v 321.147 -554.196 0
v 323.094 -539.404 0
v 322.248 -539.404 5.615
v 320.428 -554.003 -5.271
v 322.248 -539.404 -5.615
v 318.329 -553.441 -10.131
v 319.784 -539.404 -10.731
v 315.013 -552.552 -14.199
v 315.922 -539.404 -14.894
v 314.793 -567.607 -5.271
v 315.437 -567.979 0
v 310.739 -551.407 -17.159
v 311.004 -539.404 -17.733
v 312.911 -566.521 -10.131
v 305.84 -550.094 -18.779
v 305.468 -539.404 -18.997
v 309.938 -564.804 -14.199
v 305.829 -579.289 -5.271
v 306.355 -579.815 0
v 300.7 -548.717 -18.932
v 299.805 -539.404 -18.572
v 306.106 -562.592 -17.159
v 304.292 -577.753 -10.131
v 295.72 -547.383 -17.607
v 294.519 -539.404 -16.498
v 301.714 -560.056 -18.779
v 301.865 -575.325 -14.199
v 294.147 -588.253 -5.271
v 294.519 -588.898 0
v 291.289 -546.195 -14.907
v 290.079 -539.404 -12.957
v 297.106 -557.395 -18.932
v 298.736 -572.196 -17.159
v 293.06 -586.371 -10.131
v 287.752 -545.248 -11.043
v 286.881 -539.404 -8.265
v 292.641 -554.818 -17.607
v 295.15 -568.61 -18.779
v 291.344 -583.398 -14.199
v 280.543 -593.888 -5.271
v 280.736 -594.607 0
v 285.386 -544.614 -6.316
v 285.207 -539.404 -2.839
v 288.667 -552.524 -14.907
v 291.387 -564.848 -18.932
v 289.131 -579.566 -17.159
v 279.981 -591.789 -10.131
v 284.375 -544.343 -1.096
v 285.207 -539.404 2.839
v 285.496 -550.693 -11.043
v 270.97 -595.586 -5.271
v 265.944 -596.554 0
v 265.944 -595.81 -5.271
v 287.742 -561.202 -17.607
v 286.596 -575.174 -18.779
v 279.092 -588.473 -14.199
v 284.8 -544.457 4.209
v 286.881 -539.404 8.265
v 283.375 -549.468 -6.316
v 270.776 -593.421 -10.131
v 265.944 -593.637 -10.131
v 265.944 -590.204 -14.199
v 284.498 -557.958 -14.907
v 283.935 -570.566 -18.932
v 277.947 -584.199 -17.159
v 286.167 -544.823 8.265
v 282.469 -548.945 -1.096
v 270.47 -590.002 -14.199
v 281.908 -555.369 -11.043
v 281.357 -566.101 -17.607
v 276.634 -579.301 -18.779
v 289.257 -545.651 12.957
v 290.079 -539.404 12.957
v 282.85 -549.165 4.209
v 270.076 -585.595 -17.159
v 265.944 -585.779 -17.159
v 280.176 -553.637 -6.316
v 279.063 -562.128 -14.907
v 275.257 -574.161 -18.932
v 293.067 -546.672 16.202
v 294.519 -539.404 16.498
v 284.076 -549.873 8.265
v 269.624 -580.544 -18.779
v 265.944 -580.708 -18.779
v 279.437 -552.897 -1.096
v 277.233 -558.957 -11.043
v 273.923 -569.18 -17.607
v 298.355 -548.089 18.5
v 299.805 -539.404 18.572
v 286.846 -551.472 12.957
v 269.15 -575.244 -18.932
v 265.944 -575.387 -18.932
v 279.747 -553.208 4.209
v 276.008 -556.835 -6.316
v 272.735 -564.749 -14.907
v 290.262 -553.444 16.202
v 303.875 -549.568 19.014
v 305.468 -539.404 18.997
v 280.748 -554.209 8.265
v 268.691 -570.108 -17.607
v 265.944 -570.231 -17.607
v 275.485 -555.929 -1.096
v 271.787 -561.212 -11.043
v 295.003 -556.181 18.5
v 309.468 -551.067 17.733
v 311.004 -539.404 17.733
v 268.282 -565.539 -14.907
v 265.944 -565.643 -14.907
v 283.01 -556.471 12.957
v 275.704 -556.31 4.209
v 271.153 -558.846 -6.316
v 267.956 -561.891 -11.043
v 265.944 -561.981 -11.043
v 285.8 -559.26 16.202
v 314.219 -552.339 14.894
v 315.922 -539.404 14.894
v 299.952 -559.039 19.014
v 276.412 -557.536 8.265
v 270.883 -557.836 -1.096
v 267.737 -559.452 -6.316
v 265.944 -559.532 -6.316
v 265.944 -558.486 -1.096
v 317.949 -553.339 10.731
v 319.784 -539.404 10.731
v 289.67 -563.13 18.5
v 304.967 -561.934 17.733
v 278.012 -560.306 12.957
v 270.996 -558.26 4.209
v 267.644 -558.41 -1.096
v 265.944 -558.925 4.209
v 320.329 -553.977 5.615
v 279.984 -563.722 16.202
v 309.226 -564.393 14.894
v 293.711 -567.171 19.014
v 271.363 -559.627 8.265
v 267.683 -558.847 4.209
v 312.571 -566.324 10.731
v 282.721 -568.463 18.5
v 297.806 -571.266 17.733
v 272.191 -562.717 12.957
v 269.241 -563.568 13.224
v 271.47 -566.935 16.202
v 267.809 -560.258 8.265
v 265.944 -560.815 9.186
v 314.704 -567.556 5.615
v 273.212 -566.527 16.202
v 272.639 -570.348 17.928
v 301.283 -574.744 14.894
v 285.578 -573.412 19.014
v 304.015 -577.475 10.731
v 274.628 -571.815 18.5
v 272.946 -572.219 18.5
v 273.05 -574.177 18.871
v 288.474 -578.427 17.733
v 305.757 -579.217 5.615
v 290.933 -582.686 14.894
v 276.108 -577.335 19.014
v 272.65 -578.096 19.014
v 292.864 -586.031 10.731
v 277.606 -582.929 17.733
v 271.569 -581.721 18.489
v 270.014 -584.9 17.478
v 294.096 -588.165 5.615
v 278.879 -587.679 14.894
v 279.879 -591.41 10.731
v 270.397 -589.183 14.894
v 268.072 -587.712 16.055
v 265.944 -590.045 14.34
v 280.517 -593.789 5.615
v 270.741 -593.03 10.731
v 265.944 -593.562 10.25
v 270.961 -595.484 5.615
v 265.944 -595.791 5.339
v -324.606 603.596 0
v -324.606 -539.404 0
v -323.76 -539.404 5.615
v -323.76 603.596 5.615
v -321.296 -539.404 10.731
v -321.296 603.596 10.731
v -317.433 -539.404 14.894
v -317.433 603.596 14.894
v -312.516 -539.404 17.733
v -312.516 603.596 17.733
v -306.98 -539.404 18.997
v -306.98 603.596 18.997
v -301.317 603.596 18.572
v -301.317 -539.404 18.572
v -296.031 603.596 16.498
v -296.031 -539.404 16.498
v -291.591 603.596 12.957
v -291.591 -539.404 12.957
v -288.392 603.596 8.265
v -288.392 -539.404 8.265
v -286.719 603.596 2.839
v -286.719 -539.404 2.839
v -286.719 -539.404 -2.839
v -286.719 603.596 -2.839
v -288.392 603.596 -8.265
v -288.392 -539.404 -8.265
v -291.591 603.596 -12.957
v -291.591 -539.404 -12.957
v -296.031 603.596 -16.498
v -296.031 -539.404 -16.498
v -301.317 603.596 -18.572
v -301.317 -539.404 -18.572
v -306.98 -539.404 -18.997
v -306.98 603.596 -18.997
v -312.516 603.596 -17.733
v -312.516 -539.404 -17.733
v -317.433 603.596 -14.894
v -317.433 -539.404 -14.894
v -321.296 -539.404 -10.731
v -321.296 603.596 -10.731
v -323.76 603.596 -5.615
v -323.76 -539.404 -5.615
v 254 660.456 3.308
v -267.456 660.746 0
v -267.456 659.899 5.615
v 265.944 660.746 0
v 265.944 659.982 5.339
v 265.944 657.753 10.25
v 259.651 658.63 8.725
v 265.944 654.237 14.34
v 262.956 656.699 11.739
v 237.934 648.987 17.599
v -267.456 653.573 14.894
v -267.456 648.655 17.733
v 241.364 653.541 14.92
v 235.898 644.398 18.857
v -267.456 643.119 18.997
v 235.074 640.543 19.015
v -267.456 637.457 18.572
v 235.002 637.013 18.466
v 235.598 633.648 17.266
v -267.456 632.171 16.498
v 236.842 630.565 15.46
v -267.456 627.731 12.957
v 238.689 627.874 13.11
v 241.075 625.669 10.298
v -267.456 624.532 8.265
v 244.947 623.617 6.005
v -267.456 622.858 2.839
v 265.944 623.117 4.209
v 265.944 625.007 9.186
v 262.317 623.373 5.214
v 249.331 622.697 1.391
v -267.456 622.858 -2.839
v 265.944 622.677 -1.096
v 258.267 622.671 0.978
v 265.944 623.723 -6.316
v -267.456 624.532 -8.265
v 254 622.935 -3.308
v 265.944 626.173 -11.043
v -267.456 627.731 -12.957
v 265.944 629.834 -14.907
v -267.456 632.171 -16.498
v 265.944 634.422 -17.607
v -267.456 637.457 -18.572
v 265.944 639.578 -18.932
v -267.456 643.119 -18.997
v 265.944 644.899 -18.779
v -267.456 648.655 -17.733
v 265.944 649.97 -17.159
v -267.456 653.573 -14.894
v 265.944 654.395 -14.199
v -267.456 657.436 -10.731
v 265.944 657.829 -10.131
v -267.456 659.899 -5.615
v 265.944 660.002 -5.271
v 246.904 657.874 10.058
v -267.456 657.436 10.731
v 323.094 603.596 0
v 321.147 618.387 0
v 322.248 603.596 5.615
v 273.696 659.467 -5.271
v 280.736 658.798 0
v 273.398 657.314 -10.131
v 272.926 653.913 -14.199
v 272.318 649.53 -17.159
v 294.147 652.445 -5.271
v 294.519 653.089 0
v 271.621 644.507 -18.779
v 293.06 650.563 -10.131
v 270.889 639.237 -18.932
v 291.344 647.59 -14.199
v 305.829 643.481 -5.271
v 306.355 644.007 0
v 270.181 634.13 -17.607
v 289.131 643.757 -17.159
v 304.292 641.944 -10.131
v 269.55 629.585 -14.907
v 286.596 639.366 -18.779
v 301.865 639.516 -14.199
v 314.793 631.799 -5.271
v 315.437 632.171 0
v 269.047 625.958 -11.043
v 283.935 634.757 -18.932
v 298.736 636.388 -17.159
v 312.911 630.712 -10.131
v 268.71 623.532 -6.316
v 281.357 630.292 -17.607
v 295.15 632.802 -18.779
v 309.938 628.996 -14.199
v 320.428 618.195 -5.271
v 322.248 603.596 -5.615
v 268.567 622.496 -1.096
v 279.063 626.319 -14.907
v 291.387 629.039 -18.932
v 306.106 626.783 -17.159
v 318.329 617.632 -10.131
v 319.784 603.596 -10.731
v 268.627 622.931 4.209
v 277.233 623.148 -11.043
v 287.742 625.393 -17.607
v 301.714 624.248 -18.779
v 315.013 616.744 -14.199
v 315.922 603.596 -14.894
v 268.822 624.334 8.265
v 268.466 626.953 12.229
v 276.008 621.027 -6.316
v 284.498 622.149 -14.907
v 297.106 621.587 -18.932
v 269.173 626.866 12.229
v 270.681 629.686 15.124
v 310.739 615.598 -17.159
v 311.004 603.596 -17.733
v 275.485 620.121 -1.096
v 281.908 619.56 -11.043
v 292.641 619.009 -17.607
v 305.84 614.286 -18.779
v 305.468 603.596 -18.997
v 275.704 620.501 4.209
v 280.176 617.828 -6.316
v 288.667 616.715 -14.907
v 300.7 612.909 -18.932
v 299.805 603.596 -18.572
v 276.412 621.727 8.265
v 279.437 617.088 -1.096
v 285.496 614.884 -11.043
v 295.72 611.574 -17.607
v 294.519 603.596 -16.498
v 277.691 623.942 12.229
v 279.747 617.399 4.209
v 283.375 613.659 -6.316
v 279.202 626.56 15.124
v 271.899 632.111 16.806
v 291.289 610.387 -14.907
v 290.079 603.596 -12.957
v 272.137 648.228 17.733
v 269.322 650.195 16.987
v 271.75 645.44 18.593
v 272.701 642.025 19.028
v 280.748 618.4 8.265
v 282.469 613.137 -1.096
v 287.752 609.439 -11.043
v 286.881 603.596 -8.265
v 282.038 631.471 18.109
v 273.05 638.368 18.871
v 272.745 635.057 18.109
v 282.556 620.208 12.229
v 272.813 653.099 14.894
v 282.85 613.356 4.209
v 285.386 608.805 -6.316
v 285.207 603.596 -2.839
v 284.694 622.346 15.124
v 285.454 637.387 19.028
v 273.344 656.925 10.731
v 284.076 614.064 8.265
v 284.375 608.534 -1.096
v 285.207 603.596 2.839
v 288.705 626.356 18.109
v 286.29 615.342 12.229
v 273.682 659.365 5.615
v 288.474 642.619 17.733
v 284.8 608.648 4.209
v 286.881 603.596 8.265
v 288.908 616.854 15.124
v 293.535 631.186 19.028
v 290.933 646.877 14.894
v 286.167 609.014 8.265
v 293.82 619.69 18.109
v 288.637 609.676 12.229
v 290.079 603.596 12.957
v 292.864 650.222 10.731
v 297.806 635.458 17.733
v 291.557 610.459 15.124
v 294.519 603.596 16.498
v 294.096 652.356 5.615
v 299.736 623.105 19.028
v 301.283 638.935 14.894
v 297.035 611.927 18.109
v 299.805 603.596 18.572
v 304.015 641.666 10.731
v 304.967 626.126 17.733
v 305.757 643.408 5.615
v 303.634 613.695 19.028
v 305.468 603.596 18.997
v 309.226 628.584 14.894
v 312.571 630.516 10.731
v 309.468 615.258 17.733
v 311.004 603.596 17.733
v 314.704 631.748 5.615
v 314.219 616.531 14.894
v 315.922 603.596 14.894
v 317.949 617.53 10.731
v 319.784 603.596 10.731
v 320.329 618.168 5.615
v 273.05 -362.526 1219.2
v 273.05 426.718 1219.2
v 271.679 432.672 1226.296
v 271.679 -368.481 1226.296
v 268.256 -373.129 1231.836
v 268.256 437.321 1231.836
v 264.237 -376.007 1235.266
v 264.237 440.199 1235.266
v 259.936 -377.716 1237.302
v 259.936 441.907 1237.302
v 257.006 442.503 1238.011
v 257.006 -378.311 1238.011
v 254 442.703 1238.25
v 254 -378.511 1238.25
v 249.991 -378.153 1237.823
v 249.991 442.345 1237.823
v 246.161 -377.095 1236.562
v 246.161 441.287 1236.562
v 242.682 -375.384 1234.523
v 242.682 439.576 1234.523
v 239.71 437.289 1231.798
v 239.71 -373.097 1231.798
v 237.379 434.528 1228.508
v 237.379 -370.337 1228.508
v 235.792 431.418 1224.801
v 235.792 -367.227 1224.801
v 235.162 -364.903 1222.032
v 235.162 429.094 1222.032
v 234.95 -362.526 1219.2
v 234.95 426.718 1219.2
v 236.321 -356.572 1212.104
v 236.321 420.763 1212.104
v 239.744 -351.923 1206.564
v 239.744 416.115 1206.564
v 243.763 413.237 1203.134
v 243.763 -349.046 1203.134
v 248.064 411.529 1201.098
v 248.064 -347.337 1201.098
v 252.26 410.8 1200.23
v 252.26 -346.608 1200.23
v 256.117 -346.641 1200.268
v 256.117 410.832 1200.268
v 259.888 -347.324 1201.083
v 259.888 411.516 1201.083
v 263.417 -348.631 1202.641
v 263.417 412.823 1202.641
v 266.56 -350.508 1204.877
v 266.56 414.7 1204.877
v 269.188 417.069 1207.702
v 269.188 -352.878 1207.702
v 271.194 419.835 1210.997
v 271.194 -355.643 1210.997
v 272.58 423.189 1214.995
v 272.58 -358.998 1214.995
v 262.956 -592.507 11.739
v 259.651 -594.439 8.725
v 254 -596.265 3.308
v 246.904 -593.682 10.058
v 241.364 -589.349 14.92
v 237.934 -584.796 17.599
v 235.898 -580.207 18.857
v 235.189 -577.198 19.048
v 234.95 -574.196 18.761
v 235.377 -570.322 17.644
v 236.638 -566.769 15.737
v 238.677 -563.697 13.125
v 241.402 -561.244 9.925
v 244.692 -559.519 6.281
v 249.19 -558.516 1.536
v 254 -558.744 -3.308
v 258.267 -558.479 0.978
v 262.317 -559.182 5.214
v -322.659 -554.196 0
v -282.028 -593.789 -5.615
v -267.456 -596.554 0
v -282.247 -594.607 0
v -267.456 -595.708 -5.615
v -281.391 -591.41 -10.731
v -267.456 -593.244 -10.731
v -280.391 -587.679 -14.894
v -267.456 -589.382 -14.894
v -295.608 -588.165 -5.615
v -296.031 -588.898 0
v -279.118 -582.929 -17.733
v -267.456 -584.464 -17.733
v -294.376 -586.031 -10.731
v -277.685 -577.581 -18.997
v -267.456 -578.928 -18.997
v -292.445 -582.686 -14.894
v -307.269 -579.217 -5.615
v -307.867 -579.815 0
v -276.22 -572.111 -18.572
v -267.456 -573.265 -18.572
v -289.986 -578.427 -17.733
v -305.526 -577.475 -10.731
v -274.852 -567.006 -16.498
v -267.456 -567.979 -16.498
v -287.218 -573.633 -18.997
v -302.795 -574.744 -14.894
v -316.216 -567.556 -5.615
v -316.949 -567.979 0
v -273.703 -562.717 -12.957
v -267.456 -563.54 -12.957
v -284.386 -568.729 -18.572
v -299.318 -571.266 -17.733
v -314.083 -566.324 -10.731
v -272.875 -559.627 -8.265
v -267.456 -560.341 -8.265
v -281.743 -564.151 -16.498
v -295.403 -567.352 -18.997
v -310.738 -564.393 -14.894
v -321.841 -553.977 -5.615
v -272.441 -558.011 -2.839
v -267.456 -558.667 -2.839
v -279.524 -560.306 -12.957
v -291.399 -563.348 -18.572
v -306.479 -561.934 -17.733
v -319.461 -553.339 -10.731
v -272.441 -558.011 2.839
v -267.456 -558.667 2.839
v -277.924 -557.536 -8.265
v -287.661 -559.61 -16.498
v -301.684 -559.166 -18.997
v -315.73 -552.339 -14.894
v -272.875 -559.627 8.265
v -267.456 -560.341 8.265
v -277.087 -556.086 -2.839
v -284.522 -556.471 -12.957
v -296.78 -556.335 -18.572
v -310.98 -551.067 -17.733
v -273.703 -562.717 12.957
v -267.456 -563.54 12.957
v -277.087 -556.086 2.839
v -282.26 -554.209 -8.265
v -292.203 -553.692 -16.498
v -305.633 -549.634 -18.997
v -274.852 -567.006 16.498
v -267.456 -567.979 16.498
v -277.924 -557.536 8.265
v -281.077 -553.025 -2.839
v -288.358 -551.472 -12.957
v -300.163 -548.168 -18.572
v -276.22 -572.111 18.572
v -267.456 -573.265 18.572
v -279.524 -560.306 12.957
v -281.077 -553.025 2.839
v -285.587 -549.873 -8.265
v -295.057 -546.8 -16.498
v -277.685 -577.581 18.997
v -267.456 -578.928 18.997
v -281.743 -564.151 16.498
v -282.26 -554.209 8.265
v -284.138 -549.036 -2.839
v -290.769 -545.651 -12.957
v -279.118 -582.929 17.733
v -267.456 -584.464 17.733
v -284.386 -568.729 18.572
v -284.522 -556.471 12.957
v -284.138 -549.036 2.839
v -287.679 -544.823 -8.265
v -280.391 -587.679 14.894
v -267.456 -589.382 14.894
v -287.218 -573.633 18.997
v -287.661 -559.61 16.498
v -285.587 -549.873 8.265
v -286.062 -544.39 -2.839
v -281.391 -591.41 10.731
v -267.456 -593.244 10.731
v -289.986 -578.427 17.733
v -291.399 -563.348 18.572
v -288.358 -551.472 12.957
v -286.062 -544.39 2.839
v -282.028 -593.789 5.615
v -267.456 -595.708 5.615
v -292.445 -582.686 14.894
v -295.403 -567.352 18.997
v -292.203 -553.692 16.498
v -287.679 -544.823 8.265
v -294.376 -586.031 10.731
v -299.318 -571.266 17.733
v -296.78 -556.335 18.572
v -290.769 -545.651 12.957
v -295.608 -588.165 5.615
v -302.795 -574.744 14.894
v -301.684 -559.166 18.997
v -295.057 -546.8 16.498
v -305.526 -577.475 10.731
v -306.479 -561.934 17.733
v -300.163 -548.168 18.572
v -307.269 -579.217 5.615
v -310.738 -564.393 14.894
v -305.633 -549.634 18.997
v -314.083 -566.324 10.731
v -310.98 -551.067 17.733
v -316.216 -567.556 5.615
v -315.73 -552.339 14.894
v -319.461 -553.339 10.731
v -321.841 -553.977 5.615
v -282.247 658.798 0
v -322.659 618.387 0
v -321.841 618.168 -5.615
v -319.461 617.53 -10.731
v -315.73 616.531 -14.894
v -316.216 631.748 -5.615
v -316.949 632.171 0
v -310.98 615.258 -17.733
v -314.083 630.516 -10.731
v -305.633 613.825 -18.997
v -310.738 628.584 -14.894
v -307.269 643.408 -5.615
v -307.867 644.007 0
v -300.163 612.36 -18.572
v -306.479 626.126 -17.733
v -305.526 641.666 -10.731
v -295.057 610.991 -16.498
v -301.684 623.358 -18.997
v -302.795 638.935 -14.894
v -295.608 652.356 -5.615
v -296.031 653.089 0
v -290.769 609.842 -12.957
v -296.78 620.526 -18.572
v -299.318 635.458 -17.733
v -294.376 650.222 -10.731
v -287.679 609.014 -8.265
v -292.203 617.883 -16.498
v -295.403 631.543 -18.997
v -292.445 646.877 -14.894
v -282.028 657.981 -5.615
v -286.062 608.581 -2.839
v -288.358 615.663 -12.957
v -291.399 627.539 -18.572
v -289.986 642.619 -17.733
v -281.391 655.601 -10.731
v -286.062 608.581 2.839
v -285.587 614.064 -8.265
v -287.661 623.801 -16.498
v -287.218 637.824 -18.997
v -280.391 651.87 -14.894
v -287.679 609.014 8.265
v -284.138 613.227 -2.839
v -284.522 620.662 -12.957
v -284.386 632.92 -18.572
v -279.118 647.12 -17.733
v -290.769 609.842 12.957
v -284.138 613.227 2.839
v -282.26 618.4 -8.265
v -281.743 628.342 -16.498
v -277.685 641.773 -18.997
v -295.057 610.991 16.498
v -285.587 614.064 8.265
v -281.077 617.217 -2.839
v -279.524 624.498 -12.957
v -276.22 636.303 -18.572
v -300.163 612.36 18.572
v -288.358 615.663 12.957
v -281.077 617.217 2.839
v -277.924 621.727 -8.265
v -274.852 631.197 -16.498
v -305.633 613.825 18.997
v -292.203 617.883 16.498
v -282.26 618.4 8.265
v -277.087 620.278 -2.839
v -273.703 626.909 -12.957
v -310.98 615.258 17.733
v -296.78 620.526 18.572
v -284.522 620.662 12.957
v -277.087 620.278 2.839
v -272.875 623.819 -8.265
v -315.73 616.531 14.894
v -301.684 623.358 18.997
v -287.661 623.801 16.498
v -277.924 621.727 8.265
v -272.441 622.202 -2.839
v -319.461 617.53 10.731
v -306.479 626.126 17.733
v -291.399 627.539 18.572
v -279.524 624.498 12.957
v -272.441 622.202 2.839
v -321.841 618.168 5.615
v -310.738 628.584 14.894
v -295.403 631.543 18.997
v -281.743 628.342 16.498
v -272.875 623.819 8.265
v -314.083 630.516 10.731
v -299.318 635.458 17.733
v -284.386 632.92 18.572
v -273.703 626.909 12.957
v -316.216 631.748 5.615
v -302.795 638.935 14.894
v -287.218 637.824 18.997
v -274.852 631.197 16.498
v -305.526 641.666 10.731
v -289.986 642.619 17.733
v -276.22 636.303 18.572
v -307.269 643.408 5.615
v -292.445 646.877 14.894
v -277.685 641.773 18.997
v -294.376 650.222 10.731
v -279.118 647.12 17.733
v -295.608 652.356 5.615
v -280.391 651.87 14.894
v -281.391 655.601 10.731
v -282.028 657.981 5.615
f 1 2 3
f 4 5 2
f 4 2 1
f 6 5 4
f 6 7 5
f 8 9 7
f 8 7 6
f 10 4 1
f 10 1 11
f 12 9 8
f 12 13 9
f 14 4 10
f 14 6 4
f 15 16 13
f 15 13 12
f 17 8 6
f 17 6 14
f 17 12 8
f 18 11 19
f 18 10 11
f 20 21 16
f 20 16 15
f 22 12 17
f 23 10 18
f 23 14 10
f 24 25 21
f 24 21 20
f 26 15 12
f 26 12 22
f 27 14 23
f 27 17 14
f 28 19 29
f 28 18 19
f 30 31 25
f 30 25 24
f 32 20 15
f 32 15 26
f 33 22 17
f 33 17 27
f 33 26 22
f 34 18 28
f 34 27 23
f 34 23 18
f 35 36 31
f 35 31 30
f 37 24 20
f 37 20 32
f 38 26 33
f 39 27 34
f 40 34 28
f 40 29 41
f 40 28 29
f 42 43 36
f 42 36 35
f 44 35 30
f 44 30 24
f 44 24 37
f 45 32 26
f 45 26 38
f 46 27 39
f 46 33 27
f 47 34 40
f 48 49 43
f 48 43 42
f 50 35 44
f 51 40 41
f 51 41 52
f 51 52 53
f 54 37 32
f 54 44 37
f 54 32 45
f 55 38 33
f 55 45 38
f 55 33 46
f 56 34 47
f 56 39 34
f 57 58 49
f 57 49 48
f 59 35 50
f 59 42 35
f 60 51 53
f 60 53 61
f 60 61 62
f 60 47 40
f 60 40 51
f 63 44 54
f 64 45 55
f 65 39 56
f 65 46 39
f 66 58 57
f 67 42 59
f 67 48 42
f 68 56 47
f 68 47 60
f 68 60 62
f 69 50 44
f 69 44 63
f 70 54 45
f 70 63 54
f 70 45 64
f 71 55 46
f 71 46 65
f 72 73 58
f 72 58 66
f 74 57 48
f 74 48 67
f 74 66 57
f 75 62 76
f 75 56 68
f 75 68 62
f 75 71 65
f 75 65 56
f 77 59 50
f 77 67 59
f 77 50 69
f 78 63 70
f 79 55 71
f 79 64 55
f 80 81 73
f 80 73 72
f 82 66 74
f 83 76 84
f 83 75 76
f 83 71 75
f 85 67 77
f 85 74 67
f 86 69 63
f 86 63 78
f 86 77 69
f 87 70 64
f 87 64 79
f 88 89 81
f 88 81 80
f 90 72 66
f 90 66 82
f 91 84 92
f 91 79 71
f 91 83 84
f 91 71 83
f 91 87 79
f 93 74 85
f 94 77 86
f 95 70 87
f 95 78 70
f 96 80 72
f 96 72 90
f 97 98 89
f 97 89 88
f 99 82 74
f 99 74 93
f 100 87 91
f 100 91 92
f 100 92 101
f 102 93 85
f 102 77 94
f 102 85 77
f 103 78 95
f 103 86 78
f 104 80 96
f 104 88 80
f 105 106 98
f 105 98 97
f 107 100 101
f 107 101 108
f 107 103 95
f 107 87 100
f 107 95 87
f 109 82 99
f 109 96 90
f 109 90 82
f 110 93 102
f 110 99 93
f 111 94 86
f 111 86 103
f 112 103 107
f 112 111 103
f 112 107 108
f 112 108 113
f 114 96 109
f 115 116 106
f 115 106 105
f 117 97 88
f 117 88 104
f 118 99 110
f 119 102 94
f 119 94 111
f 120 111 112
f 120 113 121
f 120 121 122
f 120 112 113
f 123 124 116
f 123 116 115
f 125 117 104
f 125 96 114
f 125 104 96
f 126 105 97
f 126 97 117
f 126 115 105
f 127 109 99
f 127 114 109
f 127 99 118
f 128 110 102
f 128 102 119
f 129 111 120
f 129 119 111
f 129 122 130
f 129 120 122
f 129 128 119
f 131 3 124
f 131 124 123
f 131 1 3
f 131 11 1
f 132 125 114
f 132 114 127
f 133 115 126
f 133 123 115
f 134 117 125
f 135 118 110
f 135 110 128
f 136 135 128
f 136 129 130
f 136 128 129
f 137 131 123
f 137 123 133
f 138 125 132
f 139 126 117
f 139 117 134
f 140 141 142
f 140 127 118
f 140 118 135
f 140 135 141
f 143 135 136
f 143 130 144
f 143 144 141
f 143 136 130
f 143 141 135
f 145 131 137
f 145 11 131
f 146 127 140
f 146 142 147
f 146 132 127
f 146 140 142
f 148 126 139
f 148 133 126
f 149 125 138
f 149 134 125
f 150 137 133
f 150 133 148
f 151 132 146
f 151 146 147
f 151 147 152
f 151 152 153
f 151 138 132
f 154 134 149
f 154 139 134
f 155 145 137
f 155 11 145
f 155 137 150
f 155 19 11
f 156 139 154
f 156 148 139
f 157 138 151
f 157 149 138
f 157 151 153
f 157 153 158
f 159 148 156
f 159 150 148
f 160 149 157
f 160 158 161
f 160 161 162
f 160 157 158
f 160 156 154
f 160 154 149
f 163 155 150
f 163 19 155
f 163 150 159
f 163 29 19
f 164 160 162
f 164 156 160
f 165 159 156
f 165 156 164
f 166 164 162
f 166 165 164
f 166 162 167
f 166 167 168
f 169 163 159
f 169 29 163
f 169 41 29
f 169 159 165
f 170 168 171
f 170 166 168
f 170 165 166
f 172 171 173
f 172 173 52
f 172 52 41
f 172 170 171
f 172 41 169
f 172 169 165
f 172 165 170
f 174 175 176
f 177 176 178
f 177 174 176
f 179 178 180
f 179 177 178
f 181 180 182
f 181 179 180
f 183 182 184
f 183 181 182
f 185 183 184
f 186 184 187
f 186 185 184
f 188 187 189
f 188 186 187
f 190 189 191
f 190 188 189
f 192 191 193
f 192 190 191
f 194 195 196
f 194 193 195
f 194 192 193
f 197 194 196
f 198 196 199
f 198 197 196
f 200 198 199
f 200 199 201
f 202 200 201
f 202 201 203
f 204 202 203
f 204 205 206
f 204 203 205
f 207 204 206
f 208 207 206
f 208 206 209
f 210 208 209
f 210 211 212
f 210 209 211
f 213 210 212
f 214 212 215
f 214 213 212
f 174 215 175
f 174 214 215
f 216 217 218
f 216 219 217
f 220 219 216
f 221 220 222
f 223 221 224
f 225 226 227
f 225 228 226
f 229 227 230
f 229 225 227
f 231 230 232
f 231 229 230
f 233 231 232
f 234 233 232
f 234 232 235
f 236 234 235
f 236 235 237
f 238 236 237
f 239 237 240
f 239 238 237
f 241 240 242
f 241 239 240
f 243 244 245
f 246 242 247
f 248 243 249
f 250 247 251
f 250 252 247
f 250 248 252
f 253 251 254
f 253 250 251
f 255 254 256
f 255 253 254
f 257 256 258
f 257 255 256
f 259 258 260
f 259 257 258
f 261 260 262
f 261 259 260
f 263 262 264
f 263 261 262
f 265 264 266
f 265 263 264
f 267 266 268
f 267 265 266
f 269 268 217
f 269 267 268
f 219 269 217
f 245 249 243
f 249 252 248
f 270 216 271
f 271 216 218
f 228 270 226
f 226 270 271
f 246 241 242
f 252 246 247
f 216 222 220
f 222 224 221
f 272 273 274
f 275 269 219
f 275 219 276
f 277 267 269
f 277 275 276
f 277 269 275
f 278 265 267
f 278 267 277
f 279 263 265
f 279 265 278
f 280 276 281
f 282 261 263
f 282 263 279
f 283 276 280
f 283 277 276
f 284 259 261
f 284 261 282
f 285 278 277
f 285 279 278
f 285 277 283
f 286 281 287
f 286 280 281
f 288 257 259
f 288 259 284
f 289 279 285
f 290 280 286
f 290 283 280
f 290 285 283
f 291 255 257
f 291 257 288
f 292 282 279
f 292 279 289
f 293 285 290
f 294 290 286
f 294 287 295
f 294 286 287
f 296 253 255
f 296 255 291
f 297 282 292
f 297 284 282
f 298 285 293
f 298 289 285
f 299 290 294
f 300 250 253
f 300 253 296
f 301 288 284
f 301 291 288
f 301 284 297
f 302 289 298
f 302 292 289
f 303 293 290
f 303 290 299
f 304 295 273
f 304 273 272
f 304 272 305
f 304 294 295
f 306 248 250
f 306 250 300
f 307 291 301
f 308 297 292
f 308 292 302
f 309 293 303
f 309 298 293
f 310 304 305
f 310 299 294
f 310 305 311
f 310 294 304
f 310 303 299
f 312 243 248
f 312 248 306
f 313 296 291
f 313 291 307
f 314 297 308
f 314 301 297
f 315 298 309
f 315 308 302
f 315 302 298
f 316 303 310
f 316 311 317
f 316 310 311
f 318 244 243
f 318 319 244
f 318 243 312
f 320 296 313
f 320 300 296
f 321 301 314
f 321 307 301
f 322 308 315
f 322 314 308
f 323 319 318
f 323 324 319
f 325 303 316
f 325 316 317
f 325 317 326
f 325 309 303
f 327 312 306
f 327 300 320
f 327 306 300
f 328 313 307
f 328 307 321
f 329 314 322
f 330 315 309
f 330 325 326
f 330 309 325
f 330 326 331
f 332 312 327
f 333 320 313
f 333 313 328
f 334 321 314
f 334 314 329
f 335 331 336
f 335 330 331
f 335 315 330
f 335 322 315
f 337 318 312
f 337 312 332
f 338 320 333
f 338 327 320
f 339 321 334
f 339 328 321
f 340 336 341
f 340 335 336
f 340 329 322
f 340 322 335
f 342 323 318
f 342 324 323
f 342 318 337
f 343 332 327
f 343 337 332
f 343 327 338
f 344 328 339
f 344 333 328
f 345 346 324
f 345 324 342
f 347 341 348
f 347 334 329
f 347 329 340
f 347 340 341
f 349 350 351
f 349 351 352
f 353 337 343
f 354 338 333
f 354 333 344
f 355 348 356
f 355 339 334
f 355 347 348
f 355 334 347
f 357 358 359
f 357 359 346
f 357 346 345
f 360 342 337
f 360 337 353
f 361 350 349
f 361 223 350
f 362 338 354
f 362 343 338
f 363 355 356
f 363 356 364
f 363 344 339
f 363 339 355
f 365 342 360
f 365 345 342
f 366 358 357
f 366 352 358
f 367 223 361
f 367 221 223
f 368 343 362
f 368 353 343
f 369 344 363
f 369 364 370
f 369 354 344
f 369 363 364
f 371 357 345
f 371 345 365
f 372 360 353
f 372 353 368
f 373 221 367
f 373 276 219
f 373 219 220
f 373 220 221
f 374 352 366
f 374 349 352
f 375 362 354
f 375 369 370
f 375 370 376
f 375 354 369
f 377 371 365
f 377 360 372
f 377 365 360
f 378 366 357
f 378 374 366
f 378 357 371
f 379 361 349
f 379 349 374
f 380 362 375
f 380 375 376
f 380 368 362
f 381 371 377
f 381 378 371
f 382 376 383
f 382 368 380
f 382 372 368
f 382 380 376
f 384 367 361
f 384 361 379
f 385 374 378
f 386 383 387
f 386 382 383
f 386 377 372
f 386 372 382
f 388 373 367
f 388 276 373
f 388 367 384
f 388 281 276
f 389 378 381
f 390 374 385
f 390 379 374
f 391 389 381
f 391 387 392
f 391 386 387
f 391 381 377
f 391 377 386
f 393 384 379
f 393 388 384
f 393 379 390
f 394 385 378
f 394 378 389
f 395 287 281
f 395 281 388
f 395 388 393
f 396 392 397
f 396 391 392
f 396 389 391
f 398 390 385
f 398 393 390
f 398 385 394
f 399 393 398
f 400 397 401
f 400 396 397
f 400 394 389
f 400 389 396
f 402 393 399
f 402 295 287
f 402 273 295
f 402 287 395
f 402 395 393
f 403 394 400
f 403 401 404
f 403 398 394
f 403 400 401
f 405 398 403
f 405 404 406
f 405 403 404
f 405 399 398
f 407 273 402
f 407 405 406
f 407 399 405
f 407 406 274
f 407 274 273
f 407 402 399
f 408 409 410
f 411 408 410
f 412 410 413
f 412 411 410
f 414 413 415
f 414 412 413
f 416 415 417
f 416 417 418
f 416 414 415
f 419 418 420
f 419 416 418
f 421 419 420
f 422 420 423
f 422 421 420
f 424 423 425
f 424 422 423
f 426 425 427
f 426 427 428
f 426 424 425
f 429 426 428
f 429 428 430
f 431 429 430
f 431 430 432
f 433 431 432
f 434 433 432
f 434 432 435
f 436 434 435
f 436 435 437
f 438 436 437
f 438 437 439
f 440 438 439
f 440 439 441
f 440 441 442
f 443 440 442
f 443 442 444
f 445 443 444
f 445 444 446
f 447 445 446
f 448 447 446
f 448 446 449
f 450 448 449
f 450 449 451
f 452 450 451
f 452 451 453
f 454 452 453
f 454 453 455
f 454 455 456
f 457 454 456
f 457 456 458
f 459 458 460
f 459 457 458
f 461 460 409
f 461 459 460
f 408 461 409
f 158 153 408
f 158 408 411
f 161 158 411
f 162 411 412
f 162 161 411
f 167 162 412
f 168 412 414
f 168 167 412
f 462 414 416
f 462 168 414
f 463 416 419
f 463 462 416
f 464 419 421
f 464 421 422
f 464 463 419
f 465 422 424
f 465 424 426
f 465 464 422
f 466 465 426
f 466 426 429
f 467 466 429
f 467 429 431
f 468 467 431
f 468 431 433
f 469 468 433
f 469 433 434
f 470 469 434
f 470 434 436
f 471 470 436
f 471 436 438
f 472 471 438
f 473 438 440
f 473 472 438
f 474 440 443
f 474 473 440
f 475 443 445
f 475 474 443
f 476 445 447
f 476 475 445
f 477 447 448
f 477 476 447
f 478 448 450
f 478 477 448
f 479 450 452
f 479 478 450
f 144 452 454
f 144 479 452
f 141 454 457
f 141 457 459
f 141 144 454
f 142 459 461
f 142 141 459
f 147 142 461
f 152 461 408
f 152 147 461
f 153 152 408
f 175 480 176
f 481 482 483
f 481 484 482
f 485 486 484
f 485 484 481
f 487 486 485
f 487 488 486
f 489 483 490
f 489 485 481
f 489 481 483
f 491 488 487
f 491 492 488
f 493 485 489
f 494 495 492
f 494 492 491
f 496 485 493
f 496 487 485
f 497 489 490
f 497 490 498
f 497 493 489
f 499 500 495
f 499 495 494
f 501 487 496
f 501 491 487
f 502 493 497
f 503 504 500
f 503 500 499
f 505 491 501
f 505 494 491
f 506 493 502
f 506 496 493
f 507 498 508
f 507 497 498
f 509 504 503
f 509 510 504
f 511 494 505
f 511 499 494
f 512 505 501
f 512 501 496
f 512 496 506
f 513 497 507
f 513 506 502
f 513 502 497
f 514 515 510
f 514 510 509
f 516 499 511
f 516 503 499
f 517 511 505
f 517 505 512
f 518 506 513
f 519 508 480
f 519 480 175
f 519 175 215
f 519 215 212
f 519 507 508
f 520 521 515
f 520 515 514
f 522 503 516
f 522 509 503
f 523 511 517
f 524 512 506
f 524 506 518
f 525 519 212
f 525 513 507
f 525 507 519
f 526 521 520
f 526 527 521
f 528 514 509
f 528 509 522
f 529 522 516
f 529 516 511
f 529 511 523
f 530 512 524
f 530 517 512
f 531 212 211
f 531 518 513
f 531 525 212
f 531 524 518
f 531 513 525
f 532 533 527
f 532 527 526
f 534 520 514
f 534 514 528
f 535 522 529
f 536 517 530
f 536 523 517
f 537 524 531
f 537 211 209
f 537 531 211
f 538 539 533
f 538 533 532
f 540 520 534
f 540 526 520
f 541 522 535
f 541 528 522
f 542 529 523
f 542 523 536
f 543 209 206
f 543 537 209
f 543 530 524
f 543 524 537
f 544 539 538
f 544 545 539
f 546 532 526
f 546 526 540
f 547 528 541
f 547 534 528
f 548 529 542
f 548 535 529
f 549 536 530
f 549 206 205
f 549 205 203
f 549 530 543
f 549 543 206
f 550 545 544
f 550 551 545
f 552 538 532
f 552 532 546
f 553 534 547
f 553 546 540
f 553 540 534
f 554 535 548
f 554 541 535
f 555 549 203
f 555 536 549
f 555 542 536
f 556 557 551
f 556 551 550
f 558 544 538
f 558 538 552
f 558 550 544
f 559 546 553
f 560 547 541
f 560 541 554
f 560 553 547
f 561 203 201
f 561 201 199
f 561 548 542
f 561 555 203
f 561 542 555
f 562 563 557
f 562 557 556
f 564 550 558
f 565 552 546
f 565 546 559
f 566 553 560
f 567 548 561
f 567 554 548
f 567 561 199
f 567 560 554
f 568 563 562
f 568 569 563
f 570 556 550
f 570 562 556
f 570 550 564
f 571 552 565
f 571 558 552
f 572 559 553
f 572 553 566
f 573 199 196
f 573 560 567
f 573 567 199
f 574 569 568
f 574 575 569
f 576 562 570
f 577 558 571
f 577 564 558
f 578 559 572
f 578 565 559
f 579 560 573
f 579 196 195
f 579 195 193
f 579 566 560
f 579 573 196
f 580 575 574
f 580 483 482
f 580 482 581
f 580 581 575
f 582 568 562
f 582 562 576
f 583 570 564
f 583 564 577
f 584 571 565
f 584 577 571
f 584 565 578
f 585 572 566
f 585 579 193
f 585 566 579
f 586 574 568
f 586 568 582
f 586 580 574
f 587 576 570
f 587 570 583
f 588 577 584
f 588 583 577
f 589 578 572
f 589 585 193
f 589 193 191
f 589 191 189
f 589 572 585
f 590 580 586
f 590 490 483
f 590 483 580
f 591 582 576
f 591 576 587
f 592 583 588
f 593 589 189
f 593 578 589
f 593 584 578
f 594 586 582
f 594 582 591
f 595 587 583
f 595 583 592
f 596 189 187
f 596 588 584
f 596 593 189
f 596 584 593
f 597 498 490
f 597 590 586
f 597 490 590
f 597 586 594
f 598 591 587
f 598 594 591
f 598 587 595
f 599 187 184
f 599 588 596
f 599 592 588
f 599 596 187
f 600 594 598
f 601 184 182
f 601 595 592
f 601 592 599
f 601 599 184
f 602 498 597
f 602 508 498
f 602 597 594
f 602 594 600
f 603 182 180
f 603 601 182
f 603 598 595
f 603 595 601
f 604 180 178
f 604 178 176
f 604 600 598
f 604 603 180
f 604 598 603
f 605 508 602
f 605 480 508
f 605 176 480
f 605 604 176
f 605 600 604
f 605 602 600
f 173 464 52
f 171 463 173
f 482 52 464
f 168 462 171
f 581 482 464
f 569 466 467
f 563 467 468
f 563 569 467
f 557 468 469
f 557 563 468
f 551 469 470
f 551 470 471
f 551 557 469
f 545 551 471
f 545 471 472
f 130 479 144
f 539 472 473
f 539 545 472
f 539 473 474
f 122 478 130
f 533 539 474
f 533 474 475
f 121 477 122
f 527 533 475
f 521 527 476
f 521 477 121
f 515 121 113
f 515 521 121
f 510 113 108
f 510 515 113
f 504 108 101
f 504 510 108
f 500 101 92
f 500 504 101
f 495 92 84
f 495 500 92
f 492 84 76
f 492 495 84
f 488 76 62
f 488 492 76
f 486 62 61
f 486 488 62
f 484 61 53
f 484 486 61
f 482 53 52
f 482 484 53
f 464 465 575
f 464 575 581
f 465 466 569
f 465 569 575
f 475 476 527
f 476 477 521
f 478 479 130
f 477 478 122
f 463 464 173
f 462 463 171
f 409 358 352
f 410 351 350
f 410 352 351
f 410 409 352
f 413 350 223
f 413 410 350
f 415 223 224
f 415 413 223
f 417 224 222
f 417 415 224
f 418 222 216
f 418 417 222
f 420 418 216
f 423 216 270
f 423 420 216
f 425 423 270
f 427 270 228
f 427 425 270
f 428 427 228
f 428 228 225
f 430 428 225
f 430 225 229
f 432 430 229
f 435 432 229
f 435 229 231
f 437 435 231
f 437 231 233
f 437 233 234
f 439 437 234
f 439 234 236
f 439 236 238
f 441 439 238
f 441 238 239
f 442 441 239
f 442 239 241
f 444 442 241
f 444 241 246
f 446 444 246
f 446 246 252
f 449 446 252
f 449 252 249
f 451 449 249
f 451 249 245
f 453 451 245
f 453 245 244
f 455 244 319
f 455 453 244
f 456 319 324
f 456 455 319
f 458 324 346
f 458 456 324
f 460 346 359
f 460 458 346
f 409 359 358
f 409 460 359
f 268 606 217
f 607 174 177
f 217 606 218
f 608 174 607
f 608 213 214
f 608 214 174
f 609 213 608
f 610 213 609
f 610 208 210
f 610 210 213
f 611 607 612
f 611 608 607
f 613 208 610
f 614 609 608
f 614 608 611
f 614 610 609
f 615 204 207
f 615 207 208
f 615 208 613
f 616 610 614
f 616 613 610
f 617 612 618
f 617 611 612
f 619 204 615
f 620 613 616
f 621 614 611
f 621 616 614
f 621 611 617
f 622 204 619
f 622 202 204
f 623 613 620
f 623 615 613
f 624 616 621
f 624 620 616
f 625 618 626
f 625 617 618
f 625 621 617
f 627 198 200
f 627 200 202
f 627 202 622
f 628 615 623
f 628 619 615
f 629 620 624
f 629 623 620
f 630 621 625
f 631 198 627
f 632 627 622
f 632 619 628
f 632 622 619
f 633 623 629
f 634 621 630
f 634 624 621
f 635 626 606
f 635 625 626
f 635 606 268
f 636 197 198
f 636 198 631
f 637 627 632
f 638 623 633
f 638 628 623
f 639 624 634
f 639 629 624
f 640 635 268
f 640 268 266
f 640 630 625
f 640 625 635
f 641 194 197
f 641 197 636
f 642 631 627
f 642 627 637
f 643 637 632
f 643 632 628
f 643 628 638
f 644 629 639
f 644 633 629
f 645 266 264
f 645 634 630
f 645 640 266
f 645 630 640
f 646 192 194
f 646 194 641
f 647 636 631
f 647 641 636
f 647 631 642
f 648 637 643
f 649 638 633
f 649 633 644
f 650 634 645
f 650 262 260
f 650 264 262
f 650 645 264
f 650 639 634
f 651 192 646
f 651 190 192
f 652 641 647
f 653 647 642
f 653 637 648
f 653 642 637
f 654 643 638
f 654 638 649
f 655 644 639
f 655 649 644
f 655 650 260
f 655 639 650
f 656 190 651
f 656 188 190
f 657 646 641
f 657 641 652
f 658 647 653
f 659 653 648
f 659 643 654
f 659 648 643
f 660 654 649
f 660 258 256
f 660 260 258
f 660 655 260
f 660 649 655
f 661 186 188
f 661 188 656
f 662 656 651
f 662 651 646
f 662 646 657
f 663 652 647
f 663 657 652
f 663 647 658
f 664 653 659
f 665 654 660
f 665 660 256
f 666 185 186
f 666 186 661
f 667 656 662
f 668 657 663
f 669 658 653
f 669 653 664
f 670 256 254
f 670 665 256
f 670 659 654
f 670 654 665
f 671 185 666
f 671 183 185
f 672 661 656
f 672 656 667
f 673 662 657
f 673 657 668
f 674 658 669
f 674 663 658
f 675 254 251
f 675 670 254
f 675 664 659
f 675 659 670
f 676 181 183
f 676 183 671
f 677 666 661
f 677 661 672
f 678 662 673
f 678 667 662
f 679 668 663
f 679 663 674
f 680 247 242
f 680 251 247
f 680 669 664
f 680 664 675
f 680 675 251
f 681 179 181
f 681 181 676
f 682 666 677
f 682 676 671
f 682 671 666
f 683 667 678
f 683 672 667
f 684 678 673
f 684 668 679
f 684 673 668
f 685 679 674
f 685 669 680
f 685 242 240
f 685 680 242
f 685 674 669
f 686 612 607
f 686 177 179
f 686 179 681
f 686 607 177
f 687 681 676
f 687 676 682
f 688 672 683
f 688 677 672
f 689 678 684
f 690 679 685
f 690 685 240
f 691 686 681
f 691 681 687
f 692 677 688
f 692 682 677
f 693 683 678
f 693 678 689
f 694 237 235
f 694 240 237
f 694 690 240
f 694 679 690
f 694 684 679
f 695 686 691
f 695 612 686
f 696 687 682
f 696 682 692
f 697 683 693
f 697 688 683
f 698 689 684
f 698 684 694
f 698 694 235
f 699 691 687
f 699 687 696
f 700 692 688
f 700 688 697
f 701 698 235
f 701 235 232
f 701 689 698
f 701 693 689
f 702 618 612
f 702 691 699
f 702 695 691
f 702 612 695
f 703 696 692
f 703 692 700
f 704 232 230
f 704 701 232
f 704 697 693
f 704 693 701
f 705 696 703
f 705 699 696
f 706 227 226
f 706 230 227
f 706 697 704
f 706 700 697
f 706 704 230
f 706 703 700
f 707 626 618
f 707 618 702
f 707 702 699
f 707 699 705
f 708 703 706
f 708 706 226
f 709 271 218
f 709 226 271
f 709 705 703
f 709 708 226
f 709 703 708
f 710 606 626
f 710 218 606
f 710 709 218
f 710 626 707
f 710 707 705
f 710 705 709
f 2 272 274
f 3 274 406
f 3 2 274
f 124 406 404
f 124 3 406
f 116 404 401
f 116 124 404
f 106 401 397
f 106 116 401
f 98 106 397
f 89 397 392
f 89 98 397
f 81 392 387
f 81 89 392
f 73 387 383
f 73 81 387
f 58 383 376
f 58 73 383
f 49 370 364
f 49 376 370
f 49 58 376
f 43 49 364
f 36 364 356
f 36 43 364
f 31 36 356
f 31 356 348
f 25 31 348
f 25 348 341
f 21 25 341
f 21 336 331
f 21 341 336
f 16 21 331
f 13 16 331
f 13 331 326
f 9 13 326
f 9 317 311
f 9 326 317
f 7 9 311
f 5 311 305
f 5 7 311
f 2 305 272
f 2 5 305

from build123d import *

# Parameters (mm, degrees)
F1_R = 19.05
F5_R = 19.05


with BuildPart() as f2:
    # F2: sweep along a path in F0
    with BuildLine(Plane.XY) as f2_path:
        Line((-267.4559177475, 641.6957181156), (265.9440822525, 641.6957181156))
        ThreePointArc((265.9440822525, 641.6957181156), (292.8848506157, 630.5364864788), (304.0440822525, 603.5957181156))
        Line((304.0440822525, 603.5957181156), (304.0440822525, -539.4042818844))
        ThreePointArc((304.0440822525, -539.4042818844), (292.8848506157, -566.3450502476), (265.9440822525, -577.5042818844))
        Line((265.9440822525, -577.5042818844), (-267.4559177475, -577.5042818844))
        ThreePointArc((-267.4559177475, -577.5042818844), (-294.3966861107, -566.3450502476), (-305.5559177475, -539.4042818844))
        Line((-305.5559177475, -539.4042818844), (-305.5559177475, 603.5957181156))
        ThreePointArc((-305.5559177475, 603.5957181156), (-294.3966861107, 630.5364864788), (-267.4559177475, 641.6957181156))
    # F1 (on Right) → F2 (sweep)
    with BuildSketch(Plane.YZ):
        with Locations((641.6957181156, 0)):
            Circle(F1_R)
    sweep(path=f2_path.line)

    # F6: sweep along a path in F4
    with BuildLine(Plane.YZ.offset(254)) as f6_path:
        Line((641.6957181156, 0), (426.7178632358, 1219.2))
        Line((426.7178632358, 1219.2), (-362.5264270047, 1219.2))
        Line((-362.5264270047, 1219.2), (-577.5042818844, 0))
    # F5 (on Front) → F6 (sweep)
    with BuildSketch(Plane.XZ):
        with Locations((254, 1219.2)):
            Circle(F5_R)
    sweep(path=f6_path.line, transition=Transition.RIGHT)


solid = f2.part
